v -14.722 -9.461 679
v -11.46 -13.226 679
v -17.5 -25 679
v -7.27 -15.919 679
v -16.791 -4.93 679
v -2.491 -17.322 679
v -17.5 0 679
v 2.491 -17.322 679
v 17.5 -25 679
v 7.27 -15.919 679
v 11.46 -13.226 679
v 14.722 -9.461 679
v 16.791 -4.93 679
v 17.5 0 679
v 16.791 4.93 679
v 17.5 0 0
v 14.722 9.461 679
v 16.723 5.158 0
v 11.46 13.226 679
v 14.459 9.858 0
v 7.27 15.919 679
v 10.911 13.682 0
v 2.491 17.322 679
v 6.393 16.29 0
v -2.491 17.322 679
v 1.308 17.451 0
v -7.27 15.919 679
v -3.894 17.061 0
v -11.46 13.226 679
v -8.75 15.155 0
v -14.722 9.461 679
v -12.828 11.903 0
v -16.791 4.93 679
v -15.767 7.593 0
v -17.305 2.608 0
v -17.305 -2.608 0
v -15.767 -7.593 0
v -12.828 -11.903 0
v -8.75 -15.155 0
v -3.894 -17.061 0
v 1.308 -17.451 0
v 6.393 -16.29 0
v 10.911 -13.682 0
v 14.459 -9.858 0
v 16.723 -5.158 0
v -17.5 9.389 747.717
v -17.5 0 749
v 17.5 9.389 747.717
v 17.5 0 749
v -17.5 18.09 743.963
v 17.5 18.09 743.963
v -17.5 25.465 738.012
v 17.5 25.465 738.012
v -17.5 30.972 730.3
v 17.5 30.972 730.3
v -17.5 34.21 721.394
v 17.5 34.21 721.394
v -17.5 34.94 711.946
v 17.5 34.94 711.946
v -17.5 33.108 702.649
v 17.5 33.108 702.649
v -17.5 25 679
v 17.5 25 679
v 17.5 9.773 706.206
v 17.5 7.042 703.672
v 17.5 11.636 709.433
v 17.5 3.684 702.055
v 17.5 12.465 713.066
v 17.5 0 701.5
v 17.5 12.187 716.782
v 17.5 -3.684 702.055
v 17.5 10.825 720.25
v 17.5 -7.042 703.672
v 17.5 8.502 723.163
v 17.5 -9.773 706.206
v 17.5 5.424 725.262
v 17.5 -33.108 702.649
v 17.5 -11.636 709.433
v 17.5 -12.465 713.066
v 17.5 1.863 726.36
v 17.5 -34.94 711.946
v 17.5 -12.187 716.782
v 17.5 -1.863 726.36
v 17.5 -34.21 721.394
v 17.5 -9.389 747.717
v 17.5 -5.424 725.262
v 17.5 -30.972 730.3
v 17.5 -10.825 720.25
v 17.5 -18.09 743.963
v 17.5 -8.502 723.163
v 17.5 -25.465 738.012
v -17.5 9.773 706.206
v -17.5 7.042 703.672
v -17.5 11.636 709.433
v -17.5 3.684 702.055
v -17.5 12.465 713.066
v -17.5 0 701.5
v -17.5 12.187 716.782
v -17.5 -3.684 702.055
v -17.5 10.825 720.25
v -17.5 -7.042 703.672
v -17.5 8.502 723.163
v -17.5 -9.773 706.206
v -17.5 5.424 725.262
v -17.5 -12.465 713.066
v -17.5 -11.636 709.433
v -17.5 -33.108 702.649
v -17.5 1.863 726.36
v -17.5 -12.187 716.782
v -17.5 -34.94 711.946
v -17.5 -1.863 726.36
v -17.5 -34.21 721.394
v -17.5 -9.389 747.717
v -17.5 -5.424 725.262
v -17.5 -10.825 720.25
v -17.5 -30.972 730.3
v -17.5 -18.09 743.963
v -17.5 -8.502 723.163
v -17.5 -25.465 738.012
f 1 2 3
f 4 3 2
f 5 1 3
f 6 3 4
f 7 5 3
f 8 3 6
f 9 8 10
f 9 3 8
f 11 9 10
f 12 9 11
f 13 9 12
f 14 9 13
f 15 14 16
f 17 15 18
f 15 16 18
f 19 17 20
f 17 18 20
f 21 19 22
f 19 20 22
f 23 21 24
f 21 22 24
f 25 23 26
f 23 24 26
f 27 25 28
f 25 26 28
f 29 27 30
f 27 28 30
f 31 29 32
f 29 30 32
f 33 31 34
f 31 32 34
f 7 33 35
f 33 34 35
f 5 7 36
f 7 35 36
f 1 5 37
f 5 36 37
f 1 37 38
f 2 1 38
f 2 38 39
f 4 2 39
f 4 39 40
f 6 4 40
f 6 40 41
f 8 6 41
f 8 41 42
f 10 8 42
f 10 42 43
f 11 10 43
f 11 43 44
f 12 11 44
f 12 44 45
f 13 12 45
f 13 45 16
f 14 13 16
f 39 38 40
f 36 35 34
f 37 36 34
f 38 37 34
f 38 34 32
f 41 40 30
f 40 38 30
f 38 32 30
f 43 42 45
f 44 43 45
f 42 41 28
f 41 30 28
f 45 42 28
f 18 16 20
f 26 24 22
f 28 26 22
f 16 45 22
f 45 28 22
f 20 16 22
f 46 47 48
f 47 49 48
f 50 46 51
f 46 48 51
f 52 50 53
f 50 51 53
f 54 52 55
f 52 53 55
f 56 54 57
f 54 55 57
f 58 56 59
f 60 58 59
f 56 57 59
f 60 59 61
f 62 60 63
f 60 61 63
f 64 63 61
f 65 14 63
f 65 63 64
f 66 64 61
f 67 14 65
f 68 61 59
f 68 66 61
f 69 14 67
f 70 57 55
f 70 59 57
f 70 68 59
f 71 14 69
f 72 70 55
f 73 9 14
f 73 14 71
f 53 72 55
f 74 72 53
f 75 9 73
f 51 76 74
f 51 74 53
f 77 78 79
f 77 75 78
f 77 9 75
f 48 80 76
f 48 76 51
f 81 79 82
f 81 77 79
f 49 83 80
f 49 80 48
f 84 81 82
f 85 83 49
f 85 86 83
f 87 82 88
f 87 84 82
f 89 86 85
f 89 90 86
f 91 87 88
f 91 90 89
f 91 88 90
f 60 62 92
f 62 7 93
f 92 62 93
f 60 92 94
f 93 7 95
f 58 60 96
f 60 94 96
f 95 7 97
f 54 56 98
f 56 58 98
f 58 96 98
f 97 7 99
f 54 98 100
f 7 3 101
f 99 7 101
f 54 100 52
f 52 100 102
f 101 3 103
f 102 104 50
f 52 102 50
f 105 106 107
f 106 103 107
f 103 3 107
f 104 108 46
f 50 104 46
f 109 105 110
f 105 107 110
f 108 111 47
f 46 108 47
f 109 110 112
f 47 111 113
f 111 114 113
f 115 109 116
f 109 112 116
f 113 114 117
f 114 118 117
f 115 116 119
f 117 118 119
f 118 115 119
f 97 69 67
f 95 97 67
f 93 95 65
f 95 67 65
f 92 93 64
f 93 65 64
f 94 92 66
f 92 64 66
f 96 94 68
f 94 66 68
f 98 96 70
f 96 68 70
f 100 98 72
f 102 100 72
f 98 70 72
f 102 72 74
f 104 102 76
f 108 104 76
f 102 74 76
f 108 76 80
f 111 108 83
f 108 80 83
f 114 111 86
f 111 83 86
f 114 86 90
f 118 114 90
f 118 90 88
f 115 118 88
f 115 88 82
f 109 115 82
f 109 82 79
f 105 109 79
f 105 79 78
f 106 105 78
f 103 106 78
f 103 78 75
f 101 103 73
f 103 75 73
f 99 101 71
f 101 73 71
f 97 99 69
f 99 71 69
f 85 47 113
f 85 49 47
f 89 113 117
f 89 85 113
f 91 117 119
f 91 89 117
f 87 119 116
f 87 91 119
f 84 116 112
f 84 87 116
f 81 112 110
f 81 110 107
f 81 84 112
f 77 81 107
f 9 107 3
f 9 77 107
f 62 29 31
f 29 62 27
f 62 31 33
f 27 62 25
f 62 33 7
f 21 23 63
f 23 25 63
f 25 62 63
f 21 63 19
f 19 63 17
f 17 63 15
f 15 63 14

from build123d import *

# Parameters (mm, degrees)
SKETCH1_R           = 17.5
BOSS_EXTRUDE1_DEPTH = 679
BOSS_EXTRUDE3_DEPTH = 17.5
SKETCH5_R           = 12.5
CUT_EXTRUDE1_DEPTH  = 35


with BuildPart() as part:
    # Sketch1 → Boss-Extrude1 (new body)
    with BuildSketch(Plane.XY):
        Circle(SKETCH1_R)
    extrude(amount=BOSS_EXTRUDE1_DEPTH)

    # Sketch3 → Boss-Extrude3 (add, symmetric)
    with BuildSketch(Plane(origin=(0, 0, 0), x_dir=(0, 0, -1), z_dir=(1, 0, 0))):
        with BuildLine():
            Line((-679, 0), (-749, 0))
            ThreePointArc((-749, 0), (-734.34333678, 28.480671492), (-702.648648649, 33.108108108))
            Line((-702.648648649, 33.108108108), (-679, 25))
            Line((-679, 25), (-679, 0))
        make_face()
    boss_extrude3 = extrude(amount=BOSS_EXTRUDE3_DEPTH, both=True)

    # Mirror3: Boss-Extrude3 across plane
    add(boss_extrude3.mirror(Plane(origin=(17.5, 0, 679), x_dir=(0, 0, 1), z_dir=(0, 1, 0))))

    # Sketch5 → Cut-Extrude1 (cut)
    with BuildSketch(Plane(origin=(17.5, 0, 0), x_dir=(0, 0, -1), z_dir=(1, 0, 0))):
        with Locations((-714, 0)):
            Circle(SKETCH5_R)
    extrude(amount=-CUT_EXTRUDE1_DEPTH, mode=Mode.SUBTRACT)


solid = part.part
